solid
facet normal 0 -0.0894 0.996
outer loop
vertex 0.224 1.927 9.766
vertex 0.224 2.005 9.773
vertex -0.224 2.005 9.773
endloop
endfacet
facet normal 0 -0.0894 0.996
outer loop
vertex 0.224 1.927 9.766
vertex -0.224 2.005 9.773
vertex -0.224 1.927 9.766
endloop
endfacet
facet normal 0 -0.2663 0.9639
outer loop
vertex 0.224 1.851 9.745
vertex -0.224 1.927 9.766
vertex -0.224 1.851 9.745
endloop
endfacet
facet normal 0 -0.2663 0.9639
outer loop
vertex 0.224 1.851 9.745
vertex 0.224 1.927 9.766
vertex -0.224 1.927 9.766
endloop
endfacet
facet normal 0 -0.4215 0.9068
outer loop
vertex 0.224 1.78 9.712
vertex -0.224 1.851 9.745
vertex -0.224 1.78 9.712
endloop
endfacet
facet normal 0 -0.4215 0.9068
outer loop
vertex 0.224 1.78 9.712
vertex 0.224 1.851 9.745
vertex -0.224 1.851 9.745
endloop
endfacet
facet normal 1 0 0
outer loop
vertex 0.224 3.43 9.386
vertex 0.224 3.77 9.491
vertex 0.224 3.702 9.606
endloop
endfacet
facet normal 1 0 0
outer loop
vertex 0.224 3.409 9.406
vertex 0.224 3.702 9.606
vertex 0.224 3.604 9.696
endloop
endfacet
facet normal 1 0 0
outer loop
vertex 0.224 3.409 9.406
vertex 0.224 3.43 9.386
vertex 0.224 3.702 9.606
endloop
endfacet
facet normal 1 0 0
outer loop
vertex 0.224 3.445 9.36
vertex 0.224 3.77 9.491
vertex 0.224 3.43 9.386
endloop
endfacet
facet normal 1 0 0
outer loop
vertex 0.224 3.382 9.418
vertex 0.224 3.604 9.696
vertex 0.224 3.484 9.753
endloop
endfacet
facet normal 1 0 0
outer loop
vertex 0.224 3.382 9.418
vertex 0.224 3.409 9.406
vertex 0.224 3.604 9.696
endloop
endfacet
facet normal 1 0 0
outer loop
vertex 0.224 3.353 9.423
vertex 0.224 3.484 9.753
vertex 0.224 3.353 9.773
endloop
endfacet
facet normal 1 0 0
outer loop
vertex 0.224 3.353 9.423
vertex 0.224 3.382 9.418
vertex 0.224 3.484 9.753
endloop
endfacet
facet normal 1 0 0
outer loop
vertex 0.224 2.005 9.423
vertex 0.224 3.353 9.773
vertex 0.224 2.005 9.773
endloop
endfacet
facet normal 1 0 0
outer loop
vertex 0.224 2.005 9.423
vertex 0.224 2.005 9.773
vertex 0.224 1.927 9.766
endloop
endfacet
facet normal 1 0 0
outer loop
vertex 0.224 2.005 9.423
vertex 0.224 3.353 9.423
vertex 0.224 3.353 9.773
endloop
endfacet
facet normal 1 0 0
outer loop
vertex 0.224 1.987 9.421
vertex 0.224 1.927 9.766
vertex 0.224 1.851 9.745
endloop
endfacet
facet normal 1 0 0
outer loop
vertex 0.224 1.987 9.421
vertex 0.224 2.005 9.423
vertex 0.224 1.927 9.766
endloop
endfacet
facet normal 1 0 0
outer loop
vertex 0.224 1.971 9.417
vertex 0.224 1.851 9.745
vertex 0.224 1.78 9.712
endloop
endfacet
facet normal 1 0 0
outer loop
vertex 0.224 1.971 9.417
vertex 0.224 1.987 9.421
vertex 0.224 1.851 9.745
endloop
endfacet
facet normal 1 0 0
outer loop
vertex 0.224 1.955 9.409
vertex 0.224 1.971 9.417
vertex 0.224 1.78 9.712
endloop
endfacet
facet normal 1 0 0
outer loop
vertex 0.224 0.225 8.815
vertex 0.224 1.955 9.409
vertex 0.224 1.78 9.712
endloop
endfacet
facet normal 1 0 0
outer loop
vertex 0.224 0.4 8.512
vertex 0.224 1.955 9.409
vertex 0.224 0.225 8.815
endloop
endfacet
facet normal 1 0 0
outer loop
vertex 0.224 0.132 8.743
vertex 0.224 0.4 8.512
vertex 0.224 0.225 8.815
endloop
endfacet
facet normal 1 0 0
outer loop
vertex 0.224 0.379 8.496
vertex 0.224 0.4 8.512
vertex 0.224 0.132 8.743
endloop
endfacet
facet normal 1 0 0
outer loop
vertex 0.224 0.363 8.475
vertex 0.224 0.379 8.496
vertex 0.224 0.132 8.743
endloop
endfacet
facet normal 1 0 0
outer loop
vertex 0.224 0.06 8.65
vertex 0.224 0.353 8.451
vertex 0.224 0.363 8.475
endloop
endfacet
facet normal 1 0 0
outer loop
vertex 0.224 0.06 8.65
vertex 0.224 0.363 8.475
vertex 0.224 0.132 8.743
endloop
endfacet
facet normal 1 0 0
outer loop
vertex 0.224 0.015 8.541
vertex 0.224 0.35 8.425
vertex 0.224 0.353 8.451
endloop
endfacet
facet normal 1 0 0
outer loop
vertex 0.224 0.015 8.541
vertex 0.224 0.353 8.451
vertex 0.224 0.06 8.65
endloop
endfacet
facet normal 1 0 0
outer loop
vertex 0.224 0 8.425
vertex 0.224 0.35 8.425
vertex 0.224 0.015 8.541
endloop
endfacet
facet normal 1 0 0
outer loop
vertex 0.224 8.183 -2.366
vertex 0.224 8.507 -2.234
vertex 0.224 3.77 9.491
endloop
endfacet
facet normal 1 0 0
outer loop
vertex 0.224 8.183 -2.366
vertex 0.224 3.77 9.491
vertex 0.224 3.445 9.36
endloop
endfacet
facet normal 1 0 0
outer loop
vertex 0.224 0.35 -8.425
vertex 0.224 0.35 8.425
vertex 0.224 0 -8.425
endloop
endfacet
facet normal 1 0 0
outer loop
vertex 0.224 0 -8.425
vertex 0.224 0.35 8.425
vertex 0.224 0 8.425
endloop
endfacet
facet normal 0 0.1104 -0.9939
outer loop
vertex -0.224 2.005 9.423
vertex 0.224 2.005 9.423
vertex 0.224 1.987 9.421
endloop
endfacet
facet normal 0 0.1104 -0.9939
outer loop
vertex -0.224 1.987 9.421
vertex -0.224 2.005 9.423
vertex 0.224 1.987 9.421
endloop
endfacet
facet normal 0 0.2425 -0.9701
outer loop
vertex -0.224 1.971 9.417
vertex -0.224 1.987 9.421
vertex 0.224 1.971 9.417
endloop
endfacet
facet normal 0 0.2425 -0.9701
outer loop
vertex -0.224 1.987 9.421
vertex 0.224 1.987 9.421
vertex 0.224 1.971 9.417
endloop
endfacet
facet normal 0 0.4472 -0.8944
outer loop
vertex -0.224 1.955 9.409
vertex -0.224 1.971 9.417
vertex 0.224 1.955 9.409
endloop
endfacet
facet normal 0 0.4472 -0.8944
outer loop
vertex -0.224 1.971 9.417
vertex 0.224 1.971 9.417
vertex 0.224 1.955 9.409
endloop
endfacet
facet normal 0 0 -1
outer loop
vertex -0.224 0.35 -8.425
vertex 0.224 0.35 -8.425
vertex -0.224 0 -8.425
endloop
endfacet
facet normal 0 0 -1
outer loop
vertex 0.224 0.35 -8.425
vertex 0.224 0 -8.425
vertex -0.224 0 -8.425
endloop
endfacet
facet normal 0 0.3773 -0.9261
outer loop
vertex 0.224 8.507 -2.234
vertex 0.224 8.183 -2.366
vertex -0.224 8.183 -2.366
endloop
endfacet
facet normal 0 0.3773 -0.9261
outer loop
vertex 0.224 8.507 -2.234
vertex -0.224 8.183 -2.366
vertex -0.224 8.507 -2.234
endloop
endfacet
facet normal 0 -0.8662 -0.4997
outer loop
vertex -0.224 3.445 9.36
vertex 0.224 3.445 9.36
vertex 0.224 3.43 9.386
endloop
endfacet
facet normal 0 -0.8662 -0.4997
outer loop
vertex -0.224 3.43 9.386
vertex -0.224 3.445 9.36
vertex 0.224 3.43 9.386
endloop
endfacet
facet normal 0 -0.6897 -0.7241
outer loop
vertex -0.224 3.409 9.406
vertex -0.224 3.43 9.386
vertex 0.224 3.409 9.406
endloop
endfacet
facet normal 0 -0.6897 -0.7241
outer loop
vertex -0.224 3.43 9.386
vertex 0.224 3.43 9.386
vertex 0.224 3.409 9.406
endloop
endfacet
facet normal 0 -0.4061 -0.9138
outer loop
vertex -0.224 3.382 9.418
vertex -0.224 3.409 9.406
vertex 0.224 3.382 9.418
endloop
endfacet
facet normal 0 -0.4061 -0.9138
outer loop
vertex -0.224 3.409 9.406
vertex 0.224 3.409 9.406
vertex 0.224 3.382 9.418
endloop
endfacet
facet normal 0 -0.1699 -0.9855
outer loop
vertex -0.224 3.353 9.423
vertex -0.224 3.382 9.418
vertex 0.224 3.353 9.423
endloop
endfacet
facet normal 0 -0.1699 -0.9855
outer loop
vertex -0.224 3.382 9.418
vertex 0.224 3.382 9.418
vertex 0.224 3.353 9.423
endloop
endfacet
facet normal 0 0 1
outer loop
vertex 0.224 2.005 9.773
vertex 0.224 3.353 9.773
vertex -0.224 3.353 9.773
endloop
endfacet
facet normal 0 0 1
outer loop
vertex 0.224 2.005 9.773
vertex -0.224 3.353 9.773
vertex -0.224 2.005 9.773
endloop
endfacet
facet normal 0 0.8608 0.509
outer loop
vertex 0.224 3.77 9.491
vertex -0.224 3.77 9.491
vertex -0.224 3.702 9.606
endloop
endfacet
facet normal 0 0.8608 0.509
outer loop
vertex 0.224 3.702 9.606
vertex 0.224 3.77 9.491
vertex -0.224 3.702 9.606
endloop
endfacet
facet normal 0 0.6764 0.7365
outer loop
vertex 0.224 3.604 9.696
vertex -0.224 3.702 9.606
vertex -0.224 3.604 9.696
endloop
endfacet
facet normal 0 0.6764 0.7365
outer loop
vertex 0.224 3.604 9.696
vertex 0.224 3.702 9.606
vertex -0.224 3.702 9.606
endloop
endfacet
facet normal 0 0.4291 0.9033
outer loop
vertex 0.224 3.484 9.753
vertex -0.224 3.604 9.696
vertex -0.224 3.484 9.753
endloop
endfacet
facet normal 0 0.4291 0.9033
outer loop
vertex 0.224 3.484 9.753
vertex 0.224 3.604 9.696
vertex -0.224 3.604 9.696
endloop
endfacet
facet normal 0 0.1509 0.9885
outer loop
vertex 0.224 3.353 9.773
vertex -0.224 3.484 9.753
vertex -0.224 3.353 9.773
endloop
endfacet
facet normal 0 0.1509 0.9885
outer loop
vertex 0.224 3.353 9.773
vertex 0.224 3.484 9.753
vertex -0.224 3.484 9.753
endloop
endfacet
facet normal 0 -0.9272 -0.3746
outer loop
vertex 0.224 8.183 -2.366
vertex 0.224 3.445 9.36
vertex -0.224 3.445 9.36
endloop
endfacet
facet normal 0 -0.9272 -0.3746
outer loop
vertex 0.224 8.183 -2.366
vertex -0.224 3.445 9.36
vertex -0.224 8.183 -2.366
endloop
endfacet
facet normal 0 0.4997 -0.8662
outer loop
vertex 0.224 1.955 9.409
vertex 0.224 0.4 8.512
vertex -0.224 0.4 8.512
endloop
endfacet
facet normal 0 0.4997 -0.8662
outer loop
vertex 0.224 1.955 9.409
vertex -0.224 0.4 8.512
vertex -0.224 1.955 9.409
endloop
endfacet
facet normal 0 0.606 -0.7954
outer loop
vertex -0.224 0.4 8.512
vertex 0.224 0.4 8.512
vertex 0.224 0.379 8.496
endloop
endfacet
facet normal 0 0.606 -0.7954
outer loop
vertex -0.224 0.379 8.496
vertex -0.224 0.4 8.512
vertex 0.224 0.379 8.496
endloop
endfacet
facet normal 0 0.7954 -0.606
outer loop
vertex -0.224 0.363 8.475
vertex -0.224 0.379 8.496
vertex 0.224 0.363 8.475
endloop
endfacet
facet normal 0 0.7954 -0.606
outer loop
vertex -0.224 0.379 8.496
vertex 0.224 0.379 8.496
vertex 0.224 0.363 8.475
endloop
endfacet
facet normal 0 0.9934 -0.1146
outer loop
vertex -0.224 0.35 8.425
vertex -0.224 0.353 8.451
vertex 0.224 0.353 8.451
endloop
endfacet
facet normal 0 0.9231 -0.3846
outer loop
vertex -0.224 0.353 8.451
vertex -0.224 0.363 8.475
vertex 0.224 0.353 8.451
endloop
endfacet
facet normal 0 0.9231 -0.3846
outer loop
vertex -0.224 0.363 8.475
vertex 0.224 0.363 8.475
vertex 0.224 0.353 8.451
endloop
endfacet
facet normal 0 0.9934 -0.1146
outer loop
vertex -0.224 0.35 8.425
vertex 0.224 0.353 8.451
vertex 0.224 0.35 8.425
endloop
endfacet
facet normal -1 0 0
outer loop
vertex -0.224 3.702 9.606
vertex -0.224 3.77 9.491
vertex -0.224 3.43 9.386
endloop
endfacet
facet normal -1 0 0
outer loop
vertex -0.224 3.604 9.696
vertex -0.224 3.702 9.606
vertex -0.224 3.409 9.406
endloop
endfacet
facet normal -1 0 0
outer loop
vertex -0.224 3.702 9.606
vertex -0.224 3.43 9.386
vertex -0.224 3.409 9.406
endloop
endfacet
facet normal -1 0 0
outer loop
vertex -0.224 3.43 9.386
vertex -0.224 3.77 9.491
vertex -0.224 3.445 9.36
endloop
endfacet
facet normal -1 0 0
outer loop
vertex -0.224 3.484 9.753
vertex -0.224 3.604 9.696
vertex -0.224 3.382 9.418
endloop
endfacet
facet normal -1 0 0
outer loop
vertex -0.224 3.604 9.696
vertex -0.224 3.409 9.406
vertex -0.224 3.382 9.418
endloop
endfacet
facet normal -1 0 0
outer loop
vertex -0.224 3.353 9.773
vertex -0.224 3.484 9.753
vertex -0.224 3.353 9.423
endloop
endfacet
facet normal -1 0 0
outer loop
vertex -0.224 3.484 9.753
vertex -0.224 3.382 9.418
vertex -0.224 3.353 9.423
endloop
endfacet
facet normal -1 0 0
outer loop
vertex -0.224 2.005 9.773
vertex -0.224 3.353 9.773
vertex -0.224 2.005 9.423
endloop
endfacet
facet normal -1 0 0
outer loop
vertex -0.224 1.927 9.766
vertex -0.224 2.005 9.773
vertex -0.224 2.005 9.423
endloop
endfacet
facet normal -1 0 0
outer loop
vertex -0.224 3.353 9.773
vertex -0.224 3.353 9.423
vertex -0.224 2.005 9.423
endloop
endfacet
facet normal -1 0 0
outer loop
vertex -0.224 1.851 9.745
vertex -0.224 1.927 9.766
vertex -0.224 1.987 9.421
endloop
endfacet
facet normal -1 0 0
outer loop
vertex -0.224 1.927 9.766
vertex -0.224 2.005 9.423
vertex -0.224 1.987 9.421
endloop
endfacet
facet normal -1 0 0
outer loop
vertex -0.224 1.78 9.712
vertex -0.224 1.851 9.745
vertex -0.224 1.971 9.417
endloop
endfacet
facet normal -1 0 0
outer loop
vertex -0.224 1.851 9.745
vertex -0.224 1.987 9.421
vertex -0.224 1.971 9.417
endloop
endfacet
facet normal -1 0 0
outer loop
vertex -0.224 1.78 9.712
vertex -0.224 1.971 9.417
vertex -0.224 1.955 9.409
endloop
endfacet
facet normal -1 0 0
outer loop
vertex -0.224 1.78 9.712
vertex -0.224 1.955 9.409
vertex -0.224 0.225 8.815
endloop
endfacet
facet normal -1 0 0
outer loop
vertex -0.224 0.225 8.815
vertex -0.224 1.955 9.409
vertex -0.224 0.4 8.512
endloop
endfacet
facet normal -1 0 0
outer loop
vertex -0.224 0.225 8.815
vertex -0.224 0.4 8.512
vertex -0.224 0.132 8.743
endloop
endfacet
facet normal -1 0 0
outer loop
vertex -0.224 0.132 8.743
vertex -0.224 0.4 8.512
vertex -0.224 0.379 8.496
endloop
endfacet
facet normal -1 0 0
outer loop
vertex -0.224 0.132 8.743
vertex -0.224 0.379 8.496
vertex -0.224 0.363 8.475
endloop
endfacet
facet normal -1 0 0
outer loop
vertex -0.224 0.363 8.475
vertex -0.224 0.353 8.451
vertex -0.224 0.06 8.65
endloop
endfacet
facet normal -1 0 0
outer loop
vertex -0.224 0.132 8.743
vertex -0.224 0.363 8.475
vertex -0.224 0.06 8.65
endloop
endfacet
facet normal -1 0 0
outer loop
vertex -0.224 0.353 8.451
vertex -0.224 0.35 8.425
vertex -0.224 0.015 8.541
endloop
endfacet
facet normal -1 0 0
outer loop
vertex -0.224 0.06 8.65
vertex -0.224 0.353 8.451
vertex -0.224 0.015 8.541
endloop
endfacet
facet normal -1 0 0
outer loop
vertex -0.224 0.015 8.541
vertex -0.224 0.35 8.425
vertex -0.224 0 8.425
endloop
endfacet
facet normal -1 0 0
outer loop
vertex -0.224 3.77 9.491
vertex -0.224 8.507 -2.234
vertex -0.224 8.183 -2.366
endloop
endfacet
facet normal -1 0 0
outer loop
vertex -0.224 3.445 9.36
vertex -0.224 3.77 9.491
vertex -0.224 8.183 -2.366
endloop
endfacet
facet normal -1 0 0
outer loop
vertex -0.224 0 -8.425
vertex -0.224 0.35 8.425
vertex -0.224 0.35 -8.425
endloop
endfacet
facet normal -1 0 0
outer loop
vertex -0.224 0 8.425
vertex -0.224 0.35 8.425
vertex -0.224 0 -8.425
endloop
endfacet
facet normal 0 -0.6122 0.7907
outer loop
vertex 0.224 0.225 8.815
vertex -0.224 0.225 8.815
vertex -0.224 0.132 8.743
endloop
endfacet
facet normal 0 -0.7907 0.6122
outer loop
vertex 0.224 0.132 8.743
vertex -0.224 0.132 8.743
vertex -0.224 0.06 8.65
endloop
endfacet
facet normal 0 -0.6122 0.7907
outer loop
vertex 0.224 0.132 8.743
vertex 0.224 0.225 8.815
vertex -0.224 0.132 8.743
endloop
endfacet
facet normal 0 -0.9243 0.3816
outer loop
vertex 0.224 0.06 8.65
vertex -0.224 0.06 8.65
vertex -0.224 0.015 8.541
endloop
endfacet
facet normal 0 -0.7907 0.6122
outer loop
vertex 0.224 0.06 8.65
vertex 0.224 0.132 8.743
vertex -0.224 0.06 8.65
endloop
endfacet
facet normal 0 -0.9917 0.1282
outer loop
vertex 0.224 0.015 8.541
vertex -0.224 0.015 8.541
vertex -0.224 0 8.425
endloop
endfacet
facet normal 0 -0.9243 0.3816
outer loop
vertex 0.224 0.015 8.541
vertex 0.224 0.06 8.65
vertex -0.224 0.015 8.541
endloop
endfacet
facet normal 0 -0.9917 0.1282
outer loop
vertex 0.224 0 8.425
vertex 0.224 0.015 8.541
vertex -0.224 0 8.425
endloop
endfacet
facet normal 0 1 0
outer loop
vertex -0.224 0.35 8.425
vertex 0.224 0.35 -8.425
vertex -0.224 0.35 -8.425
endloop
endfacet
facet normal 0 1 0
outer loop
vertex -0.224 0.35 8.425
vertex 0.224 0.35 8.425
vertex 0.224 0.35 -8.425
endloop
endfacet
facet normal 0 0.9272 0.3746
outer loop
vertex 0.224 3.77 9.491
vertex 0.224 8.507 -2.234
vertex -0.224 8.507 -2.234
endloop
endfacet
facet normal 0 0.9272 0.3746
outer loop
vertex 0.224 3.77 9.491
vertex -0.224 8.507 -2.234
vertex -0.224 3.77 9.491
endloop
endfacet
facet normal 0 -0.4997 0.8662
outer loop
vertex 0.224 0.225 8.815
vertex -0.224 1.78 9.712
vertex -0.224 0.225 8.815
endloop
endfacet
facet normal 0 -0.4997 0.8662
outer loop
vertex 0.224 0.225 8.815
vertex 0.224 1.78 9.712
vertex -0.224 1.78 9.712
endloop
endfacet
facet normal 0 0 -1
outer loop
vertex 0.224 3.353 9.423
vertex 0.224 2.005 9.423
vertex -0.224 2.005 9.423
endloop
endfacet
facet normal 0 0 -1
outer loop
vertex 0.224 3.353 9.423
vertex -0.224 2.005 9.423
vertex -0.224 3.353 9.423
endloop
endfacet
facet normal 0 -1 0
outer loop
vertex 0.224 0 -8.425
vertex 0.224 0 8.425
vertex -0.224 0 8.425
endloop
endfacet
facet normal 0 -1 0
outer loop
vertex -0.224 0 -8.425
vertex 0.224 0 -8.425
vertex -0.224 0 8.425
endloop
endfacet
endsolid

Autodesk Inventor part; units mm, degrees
ref_plane "YZ Plane" through (0, 0, 0) normal (1, 0, 0) x (0, 1, 0)
ref_plane "XZ Plane" through (0, 0, 0) normal (0, 1, 0) x (-1, 0, 0)
ref_plane "XY Plane" through (0, 0, 0) normal (0, 0, 1) x (1, 0, 0)
sketch "Sketch1" plane through (0, 0, 0) normal (0, 1, 0) x (-1, 0, 0)
  line L0 (0.224, 8.425) -> (-0.224, 8.425)
  line L1 (-0.224, 8.425) -> (-0.224, -8.425)
  line L2 (-0.224, -8.425) -> (0.224, -8.425)
  line L3 (0.224, -8.425) -> (0.224, 8.425)
  line L4 (0.224, 8.425) -> (-0.224, -8.425) construction
  line L5 (-0.224, 8.425) -> (0.224, -8.425) construction
  point P0 (0, 0)
  dimension "d0" = 0.448
  dimension "d1" = 16.85
extrude "Plate1" add sketch "Sketch1" along normal blind 0.35
sketch "Sketch2" plane through (0.224, 0.4, 8.5116) normal (0, -0.5, 0.8660254) x (1, 0, 0)
  line L0 (-0.448, 0) -> (0, 0)
  line L1 (0, 0) -> (0, 1.7952)
  line L2 (0, 1.7952) -> (-0.448, 1.7952)
  line L3 (-0.448, 1.7952) -> (-0.448, 0)
edge flange "Flange1" height 2.055 angle 60 thickness 0.35 bend radius 0.1 thickness toward (0, -0.5, 0.8660254) relief tear relief width 0.35 relief depth 0.175 edges at (0, 0.35, 8.425) wall of the first edge with corners at (-0.224, 0.4, 8.5116) (0.224, 0.4, 8.5116) (0.224, 1.9547, 9.4092) (-0.224, 1.9547, 9.4092)
bend "Bend1"
corner "Corner1"
sketch "Sketch3" plane through (0.224, 2.0047, 9.4226) normal (0, 0, 1) x (1, 0, 0)
  line L0 (-0.448, 0) -> (0, 0)
  line L1 (0, 0) -> (0, 1.3479)
  line L2 (0, 1.3479) -> (-0.448, 1.3479)
  line L3 (-0.448, 1.3479) -> (-0.448, 0)
edge flange "Flange2" height 1.4685 angle 30 thickness 0.35 bend radius 0.1 thickness toward (0, 0, 1) relief tear relief width 0.35 relief depth 0.175 edges at (0, 1.9547, 9.4092) wall of the first edge with corners at (-0.224, 2.0047, 9.4226) (0.224, 2.0047, 9.4226) (0.224, 3.3526, 9.4226) (-0.224, 3.3526, 9.4226)
bend "Bend2"
corner "Corner2"
sketch "Sketch4" plane through (0.224, 3.4453, 9.3601) normal (0, 0.9271839, 0.3746066) x (-1, 0, 0)
  line L0 (0.448, 0) -> (0, 0)
  line L1 (0, 0) -> (0, -12.6465)
  line L2 (0, -12.6465) -> (0.448, -12.6465)
  line L3 (0.448, -12.6465) -> (0.448, 0)
edge flange "Flange3" height 12.95 angle 68 thickness 0.35 bend radius 0.1 thickness toward (0, 0.9271839, 0.3746066) relief tear relief width 0.35 relief depth 0.175 edges at (0, 3.3526, 9.4226) wall of the first edge with corners at (-0.224, 3.4453, 9.3601) (0.224, 3.4453, 9.3601) (0.224, 8.1828, -2.3655) (-0.224, 8.1828, -2.3655)
bend "Bend3"
corner "Corner3"
equation "\"d2\" = Thickness"
equation "\"d3\" = BendReliefWidth"
equation "\"d4\" = BendReliefDepth"
equation "\"d5\" = MinimumRemnant"
equation "\"d6\" = TransitionRadius"
equation "\"d9\" = BendRadius"
equation "\"d10\" = CornerReliefSize"
equation "\"d11\" = GapSize"
equation "\"d12\" = JacobiRadiusSize"
equation "\"d13\" = BendReliefWidth"
equation "\"d14\" = BendReliefDepth"
equation "\"d15\" = MinimumRemnant"
equation "\"d16\" = TransitionRadius"
equation "\"d19\" = BendRadius"
equation "\"d20\" = CornerReliefSize"
equation "\"d21\" = GapSize"
equation "\"d22\" = JacobiRadiusSize"
equation "\"d23\" = BendReliefWidth"
equation "\"d24\" = BendReliefDepth"
equation "\"d25\" = MinimumRemnant"
equation "\"d26\" = TransitionRadius"
equation "\"d29\" = BendRadius"
equation "\"d30\" = CornerReliefSize"
equation "\"d31\" = GapSize"
equation "\"d32\" = JacobiRadiusSize"
equation "\"BendReliefWidth\" = Thickness"
equation "\"BendReliefDepth\" = 0.5 * Thickness"
equation "\"CornerReliefSize\" = 4 * Thickness"
equation "\"MinimumRemnant\" = 2 * Thickness"
equation "\"TransitionRadius\" = BendRadius"
equation "\"JacobiRadiusSize\" = BendRadius"
equation "\"GapSize\" = Thickness"
equation "\"Thickness\" = 0.35"
equation "\"BendRadius\" = 0.1"
properties part number "RJ45 Even Pins" material "Nickel-Copper Alloy 400"
